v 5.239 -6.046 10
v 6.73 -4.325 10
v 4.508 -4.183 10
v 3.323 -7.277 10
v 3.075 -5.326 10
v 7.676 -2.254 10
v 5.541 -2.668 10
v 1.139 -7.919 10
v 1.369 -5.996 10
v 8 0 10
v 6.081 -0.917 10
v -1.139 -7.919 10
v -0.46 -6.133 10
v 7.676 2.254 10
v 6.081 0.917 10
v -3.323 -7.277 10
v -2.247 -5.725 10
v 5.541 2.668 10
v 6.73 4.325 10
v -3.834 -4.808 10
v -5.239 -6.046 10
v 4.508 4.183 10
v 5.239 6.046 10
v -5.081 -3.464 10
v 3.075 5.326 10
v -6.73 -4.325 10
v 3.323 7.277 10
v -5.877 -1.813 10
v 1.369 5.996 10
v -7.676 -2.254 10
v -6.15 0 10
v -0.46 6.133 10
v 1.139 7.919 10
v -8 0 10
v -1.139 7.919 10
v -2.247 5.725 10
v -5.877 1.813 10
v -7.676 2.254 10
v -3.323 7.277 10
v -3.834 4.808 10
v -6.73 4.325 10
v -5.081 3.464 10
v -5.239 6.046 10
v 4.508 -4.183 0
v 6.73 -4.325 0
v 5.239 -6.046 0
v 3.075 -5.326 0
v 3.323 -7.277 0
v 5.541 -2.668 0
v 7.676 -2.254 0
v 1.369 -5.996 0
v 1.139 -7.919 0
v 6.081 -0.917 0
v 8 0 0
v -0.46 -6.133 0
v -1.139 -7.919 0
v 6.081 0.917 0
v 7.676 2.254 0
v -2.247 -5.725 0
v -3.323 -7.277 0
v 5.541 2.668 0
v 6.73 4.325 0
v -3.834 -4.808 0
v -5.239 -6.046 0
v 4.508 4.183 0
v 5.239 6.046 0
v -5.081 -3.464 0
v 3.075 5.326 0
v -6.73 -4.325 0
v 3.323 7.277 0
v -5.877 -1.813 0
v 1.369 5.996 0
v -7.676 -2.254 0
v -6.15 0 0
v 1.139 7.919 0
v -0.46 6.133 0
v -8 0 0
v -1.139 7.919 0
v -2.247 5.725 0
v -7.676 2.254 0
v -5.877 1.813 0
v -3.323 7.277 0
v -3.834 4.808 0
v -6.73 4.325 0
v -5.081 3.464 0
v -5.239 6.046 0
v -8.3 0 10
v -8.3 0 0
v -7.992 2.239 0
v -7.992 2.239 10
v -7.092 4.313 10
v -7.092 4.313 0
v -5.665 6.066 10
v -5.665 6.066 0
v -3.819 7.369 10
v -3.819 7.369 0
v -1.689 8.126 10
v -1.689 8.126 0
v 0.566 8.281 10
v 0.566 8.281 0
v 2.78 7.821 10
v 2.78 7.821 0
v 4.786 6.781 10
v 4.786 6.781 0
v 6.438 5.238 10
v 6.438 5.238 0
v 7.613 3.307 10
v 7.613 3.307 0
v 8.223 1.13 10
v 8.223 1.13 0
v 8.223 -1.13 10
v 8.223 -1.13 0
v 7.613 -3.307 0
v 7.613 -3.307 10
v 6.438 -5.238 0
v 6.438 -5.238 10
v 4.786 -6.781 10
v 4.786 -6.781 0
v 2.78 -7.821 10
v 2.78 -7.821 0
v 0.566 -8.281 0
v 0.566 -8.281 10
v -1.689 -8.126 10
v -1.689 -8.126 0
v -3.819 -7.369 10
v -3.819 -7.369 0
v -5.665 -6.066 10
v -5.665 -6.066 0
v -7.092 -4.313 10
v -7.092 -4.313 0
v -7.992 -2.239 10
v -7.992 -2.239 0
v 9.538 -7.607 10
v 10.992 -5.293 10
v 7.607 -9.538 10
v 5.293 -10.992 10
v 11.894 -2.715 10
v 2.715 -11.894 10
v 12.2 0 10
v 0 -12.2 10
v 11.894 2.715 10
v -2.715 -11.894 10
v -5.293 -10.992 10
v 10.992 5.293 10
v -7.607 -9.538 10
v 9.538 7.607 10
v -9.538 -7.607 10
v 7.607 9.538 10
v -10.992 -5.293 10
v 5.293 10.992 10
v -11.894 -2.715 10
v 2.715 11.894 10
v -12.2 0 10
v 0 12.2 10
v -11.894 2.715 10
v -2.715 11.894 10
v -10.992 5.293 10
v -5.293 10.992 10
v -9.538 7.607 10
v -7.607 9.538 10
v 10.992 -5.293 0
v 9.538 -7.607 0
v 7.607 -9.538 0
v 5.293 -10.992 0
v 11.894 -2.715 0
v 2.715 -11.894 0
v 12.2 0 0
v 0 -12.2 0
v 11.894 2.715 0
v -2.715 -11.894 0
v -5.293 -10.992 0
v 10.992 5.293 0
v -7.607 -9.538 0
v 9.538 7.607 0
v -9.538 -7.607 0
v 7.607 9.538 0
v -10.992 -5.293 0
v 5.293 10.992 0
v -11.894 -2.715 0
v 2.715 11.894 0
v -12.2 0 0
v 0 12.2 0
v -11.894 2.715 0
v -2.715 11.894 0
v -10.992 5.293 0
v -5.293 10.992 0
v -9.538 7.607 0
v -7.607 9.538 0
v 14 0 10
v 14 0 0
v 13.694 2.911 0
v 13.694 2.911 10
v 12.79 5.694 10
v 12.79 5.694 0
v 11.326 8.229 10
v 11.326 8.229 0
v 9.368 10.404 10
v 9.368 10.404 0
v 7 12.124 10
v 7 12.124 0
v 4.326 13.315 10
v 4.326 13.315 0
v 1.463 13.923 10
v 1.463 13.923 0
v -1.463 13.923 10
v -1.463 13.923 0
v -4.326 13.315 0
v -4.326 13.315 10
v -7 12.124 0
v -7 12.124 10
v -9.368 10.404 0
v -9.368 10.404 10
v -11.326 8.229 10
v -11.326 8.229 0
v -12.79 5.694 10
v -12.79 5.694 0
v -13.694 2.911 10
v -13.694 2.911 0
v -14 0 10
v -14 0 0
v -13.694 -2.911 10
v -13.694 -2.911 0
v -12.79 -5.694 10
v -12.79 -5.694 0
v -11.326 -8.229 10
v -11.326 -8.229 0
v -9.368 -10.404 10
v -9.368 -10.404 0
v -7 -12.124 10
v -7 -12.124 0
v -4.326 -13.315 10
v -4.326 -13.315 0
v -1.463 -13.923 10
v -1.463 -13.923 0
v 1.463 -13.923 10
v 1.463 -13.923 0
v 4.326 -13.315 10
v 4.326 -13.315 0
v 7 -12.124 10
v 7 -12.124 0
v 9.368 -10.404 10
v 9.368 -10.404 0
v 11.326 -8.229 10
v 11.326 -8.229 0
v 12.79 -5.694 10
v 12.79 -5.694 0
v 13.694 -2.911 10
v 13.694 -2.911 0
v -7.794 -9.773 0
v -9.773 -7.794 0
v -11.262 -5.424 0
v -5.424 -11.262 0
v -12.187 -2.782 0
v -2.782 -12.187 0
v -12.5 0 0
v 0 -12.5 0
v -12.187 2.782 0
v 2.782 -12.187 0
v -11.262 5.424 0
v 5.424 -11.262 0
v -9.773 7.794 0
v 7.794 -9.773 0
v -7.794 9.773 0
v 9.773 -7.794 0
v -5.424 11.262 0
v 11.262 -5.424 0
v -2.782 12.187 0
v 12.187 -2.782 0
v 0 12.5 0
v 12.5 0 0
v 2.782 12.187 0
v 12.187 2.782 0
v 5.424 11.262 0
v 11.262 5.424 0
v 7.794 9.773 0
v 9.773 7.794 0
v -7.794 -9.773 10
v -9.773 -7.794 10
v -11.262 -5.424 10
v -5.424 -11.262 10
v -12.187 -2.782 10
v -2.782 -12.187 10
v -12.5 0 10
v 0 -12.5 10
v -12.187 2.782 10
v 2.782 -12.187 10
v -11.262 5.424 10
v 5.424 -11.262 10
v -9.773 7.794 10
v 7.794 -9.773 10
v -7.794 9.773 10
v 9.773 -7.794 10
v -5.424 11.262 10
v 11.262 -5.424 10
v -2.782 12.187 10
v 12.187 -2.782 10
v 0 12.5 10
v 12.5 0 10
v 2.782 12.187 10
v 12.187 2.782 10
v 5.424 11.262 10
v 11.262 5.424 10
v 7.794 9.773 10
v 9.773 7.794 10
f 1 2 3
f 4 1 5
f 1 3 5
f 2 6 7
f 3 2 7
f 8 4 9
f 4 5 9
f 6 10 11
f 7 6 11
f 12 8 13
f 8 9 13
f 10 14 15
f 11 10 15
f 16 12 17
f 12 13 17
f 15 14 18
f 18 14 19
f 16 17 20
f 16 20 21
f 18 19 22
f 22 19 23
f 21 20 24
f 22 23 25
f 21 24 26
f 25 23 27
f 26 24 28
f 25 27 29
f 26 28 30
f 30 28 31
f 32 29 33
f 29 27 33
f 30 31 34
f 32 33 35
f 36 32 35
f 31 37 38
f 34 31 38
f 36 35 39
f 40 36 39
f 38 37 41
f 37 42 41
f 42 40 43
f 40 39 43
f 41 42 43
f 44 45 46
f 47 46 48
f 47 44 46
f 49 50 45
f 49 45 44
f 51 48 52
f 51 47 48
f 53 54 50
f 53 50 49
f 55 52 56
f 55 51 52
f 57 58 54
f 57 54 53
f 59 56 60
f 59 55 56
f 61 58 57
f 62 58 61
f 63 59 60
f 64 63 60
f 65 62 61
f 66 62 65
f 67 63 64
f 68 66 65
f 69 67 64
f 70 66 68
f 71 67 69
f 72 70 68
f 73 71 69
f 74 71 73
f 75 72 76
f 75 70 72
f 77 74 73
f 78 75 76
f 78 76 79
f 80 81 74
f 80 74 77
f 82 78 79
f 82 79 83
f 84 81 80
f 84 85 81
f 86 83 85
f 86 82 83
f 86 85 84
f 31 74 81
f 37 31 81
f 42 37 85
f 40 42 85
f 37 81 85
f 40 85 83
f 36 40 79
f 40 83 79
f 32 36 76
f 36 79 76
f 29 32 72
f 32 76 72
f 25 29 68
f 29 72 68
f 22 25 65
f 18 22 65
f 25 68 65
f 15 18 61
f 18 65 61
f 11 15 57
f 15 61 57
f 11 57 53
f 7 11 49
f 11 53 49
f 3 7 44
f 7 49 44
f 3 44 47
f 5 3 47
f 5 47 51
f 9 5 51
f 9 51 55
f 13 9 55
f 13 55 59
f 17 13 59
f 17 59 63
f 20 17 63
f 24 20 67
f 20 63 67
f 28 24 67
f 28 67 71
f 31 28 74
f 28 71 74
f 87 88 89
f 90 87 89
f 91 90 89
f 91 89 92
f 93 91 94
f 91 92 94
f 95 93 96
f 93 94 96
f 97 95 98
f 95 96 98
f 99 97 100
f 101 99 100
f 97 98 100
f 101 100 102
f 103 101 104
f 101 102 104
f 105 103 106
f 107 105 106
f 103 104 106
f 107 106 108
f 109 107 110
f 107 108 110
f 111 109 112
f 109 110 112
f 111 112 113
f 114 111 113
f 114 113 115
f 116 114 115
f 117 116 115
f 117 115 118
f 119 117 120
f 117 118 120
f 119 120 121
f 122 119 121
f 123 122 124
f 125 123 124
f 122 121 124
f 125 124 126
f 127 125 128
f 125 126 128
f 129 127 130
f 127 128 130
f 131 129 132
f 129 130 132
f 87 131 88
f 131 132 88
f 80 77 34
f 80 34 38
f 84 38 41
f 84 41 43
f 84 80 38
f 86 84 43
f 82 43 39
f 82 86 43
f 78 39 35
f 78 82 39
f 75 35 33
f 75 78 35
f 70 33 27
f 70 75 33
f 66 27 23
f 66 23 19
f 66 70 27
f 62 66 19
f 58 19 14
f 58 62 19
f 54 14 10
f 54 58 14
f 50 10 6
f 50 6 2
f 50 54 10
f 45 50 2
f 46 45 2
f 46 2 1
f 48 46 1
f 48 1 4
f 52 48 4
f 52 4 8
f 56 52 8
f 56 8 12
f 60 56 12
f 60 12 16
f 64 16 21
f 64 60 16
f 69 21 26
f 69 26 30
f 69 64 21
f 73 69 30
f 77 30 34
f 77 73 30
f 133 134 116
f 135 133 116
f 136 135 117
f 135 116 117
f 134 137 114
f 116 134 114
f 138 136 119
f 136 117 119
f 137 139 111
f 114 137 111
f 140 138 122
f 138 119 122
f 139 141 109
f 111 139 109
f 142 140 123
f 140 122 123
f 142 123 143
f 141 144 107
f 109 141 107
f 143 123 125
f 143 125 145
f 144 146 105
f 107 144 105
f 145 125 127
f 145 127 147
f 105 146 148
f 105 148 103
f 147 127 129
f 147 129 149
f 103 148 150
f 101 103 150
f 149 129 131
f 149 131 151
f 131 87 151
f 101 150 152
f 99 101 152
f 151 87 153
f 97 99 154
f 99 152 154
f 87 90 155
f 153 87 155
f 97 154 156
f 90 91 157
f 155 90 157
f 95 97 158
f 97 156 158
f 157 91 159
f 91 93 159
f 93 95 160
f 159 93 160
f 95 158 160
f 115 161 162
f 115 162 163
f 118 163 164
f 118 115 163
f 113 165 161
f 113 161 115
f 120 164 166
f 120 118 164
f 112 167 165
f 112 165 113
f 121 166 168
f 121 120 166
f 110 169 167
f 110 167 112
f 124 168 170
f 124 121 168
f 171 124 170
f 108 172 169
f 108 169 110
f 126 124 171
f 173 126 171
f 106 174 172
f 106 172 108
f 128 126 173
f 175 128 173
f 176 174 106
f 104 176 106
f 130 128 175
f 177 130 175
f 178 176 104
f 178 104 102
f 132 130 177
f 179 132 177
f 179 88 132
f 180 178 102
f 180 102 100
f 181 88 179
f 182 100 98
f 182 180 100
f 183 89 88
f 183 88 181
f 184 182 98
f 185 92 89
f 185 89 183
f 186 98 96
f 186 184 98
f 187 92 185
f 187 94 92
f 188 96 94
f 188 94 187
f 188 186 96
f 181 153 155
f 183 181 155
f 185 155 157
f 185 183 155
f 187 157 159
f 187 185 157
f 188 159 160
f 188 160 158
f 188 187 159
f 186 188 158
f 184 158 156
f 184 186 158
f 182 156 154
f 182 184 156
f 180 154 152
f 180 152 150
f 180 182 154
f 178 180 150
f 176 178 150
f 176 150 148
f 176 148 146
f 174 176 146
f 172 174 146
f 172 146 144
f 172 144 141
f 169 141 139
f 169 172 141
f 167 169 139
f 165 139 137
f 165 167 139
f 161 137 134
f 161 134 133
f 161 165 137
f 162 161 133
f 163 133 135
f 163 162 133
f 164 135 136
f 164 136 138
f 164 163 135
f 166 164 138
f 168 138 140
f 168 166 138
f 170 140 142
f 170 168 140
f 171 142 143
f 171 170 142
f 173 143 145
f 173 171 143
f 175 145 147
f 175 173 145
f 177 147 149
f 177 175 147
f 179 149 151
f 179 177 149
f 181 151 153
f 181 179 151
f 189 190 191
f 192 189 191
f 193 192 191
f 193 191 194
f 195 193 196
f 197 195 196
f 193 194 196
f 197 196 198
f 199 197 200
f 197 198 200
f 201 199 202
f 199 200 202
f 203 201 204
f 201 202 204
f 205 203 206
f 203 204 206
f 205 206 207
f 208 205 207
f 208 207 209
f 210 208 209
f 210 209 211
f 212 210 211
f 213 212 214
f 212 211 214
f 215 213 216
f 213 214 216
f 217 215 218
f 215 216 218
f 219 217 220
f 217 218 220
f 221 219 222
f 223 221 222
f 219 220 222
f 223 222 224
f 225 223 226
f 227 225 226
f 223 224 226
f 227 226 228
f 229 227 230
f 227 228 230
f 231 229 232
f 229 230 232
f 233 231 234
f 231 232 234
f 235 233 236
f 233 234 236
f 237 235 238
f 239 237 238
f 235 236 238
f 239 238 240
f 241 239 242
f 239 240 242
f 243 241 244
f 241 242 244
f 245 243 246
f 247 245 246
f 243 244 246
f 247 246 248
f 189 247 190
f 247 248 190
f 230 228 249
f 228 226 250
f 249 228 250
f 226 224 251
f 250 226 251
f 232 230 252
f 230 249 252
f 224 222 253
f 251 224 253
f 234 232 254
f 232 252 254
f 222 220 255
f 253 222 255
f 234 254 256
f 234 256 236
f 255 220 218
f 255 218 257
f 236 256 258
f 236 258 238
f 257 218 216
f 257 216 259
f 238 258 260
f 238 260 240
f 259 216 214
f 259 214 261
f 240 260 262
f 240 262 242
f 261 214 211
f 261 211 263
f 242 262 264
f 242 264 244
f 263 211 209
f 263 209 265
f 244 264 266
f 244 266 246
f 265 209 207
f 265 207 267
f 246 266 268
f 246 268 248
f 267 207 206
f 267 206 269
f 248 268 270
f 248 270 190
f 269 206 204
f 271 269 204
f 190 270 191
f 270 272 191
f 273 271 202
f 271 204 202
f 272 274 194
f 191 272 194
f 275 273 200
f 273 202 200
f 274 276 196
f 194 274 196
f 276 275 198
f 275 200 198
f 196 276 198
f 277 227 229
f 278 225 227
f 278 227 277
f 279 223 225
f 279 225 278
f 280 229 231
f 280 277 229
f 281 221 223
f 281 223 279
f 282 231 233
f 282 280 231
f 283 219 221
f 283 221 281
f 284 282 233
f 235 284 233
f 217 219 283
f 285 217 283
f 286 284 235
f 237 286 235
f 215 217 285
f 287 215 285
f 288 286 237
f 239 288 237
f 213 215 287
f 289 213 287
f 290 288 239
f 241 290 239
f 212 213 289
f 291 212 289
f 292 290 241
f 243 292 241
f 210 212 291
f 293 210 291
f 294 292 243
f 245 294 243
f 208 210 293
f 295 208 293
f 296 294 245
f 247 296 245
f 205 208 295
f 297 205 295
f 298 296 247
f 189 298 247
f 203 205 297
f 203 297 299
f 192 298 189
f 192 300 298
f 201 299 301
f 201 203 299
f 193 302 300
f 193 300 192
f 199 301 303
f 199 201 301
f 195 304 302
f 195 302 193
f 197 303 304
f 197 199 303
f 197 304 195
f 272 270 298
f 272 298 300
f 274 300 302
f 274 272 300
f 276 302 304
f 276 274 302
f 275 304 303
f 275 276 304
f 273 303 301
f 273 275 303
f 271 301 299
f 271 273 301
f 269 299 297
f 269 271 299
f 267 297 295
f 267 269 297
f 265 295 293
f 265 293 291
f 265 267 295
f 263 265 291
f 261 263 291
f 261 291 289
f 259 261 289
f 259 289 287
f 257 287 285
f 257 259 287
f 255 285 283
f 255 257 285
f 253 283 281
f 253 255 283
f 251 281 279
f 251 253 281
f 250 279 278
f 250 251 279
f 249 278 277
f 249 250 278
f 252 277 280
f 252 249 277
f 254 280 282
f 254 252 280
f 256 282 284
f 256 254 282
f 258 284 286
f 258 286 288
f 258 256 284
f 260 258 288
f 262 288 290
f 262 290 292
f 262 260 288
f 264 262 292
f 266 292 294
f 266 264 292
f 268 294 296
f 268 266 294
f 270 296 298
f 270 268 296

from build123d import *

# Parameters (mm, degrees)
SKETCH1_R           = 14
SKETCH1_R_2         = 12.5
BOSS_EXTRUDE1_DEPTH = 10
SKETCH2_R           = 12.2
SKETCH2_R_2         = 8.3
BOSS_EXTRUDE2_DEPTH = 10
SKETCH3_R           = 8
SKETCH3_R_2         = 6.15
BOSS_EXTRUDE3_DEPTH = 10


with BuildPart() as part:
    # Sketch1 → Boss-Extrude1 (new body)
    with BuildSketch(Plane.XY):
        Circle(SKETCH1_R)
        Circle(SKETCH1_R_2, mode=Mode.SUBTRACT)
    extrude(amount=BOSS_EXTRUDE1_DEPTH)


with BuildPart() as body_2:
    # Sketch2 → Boss-Extrude2 (new body)
    with BuildSketch(Plane(origin=(0, 0, 0), x_dir=(-1, 0, 0), z_dir=(0, 0, -1))):
        Circle(SKETCH2_R)
        Circle(SKETCH2_R_2, mode=Mode.SUBTRACT)
    extrude(amount=-BOSS_EXTRUDE2_DEPTH)


with BuildPart() as body_3:
    # Sketch3 → Boss-Extrude3 (new body)
    with BuildSketch(Plane(origin=(0, 0, 0), x_dir=(-1, 0, 0), z_dir=(0, 0, -1))):
        Circle(SKETCH3_R)
        Circle(SKETCH3_R_2, mode=Mode.SUBTRACT)
    extrude(amount=-BOSS_EXTRUDE3_DEPTH)


solid = Compound([part.part, body_2.part, body_3.part])
